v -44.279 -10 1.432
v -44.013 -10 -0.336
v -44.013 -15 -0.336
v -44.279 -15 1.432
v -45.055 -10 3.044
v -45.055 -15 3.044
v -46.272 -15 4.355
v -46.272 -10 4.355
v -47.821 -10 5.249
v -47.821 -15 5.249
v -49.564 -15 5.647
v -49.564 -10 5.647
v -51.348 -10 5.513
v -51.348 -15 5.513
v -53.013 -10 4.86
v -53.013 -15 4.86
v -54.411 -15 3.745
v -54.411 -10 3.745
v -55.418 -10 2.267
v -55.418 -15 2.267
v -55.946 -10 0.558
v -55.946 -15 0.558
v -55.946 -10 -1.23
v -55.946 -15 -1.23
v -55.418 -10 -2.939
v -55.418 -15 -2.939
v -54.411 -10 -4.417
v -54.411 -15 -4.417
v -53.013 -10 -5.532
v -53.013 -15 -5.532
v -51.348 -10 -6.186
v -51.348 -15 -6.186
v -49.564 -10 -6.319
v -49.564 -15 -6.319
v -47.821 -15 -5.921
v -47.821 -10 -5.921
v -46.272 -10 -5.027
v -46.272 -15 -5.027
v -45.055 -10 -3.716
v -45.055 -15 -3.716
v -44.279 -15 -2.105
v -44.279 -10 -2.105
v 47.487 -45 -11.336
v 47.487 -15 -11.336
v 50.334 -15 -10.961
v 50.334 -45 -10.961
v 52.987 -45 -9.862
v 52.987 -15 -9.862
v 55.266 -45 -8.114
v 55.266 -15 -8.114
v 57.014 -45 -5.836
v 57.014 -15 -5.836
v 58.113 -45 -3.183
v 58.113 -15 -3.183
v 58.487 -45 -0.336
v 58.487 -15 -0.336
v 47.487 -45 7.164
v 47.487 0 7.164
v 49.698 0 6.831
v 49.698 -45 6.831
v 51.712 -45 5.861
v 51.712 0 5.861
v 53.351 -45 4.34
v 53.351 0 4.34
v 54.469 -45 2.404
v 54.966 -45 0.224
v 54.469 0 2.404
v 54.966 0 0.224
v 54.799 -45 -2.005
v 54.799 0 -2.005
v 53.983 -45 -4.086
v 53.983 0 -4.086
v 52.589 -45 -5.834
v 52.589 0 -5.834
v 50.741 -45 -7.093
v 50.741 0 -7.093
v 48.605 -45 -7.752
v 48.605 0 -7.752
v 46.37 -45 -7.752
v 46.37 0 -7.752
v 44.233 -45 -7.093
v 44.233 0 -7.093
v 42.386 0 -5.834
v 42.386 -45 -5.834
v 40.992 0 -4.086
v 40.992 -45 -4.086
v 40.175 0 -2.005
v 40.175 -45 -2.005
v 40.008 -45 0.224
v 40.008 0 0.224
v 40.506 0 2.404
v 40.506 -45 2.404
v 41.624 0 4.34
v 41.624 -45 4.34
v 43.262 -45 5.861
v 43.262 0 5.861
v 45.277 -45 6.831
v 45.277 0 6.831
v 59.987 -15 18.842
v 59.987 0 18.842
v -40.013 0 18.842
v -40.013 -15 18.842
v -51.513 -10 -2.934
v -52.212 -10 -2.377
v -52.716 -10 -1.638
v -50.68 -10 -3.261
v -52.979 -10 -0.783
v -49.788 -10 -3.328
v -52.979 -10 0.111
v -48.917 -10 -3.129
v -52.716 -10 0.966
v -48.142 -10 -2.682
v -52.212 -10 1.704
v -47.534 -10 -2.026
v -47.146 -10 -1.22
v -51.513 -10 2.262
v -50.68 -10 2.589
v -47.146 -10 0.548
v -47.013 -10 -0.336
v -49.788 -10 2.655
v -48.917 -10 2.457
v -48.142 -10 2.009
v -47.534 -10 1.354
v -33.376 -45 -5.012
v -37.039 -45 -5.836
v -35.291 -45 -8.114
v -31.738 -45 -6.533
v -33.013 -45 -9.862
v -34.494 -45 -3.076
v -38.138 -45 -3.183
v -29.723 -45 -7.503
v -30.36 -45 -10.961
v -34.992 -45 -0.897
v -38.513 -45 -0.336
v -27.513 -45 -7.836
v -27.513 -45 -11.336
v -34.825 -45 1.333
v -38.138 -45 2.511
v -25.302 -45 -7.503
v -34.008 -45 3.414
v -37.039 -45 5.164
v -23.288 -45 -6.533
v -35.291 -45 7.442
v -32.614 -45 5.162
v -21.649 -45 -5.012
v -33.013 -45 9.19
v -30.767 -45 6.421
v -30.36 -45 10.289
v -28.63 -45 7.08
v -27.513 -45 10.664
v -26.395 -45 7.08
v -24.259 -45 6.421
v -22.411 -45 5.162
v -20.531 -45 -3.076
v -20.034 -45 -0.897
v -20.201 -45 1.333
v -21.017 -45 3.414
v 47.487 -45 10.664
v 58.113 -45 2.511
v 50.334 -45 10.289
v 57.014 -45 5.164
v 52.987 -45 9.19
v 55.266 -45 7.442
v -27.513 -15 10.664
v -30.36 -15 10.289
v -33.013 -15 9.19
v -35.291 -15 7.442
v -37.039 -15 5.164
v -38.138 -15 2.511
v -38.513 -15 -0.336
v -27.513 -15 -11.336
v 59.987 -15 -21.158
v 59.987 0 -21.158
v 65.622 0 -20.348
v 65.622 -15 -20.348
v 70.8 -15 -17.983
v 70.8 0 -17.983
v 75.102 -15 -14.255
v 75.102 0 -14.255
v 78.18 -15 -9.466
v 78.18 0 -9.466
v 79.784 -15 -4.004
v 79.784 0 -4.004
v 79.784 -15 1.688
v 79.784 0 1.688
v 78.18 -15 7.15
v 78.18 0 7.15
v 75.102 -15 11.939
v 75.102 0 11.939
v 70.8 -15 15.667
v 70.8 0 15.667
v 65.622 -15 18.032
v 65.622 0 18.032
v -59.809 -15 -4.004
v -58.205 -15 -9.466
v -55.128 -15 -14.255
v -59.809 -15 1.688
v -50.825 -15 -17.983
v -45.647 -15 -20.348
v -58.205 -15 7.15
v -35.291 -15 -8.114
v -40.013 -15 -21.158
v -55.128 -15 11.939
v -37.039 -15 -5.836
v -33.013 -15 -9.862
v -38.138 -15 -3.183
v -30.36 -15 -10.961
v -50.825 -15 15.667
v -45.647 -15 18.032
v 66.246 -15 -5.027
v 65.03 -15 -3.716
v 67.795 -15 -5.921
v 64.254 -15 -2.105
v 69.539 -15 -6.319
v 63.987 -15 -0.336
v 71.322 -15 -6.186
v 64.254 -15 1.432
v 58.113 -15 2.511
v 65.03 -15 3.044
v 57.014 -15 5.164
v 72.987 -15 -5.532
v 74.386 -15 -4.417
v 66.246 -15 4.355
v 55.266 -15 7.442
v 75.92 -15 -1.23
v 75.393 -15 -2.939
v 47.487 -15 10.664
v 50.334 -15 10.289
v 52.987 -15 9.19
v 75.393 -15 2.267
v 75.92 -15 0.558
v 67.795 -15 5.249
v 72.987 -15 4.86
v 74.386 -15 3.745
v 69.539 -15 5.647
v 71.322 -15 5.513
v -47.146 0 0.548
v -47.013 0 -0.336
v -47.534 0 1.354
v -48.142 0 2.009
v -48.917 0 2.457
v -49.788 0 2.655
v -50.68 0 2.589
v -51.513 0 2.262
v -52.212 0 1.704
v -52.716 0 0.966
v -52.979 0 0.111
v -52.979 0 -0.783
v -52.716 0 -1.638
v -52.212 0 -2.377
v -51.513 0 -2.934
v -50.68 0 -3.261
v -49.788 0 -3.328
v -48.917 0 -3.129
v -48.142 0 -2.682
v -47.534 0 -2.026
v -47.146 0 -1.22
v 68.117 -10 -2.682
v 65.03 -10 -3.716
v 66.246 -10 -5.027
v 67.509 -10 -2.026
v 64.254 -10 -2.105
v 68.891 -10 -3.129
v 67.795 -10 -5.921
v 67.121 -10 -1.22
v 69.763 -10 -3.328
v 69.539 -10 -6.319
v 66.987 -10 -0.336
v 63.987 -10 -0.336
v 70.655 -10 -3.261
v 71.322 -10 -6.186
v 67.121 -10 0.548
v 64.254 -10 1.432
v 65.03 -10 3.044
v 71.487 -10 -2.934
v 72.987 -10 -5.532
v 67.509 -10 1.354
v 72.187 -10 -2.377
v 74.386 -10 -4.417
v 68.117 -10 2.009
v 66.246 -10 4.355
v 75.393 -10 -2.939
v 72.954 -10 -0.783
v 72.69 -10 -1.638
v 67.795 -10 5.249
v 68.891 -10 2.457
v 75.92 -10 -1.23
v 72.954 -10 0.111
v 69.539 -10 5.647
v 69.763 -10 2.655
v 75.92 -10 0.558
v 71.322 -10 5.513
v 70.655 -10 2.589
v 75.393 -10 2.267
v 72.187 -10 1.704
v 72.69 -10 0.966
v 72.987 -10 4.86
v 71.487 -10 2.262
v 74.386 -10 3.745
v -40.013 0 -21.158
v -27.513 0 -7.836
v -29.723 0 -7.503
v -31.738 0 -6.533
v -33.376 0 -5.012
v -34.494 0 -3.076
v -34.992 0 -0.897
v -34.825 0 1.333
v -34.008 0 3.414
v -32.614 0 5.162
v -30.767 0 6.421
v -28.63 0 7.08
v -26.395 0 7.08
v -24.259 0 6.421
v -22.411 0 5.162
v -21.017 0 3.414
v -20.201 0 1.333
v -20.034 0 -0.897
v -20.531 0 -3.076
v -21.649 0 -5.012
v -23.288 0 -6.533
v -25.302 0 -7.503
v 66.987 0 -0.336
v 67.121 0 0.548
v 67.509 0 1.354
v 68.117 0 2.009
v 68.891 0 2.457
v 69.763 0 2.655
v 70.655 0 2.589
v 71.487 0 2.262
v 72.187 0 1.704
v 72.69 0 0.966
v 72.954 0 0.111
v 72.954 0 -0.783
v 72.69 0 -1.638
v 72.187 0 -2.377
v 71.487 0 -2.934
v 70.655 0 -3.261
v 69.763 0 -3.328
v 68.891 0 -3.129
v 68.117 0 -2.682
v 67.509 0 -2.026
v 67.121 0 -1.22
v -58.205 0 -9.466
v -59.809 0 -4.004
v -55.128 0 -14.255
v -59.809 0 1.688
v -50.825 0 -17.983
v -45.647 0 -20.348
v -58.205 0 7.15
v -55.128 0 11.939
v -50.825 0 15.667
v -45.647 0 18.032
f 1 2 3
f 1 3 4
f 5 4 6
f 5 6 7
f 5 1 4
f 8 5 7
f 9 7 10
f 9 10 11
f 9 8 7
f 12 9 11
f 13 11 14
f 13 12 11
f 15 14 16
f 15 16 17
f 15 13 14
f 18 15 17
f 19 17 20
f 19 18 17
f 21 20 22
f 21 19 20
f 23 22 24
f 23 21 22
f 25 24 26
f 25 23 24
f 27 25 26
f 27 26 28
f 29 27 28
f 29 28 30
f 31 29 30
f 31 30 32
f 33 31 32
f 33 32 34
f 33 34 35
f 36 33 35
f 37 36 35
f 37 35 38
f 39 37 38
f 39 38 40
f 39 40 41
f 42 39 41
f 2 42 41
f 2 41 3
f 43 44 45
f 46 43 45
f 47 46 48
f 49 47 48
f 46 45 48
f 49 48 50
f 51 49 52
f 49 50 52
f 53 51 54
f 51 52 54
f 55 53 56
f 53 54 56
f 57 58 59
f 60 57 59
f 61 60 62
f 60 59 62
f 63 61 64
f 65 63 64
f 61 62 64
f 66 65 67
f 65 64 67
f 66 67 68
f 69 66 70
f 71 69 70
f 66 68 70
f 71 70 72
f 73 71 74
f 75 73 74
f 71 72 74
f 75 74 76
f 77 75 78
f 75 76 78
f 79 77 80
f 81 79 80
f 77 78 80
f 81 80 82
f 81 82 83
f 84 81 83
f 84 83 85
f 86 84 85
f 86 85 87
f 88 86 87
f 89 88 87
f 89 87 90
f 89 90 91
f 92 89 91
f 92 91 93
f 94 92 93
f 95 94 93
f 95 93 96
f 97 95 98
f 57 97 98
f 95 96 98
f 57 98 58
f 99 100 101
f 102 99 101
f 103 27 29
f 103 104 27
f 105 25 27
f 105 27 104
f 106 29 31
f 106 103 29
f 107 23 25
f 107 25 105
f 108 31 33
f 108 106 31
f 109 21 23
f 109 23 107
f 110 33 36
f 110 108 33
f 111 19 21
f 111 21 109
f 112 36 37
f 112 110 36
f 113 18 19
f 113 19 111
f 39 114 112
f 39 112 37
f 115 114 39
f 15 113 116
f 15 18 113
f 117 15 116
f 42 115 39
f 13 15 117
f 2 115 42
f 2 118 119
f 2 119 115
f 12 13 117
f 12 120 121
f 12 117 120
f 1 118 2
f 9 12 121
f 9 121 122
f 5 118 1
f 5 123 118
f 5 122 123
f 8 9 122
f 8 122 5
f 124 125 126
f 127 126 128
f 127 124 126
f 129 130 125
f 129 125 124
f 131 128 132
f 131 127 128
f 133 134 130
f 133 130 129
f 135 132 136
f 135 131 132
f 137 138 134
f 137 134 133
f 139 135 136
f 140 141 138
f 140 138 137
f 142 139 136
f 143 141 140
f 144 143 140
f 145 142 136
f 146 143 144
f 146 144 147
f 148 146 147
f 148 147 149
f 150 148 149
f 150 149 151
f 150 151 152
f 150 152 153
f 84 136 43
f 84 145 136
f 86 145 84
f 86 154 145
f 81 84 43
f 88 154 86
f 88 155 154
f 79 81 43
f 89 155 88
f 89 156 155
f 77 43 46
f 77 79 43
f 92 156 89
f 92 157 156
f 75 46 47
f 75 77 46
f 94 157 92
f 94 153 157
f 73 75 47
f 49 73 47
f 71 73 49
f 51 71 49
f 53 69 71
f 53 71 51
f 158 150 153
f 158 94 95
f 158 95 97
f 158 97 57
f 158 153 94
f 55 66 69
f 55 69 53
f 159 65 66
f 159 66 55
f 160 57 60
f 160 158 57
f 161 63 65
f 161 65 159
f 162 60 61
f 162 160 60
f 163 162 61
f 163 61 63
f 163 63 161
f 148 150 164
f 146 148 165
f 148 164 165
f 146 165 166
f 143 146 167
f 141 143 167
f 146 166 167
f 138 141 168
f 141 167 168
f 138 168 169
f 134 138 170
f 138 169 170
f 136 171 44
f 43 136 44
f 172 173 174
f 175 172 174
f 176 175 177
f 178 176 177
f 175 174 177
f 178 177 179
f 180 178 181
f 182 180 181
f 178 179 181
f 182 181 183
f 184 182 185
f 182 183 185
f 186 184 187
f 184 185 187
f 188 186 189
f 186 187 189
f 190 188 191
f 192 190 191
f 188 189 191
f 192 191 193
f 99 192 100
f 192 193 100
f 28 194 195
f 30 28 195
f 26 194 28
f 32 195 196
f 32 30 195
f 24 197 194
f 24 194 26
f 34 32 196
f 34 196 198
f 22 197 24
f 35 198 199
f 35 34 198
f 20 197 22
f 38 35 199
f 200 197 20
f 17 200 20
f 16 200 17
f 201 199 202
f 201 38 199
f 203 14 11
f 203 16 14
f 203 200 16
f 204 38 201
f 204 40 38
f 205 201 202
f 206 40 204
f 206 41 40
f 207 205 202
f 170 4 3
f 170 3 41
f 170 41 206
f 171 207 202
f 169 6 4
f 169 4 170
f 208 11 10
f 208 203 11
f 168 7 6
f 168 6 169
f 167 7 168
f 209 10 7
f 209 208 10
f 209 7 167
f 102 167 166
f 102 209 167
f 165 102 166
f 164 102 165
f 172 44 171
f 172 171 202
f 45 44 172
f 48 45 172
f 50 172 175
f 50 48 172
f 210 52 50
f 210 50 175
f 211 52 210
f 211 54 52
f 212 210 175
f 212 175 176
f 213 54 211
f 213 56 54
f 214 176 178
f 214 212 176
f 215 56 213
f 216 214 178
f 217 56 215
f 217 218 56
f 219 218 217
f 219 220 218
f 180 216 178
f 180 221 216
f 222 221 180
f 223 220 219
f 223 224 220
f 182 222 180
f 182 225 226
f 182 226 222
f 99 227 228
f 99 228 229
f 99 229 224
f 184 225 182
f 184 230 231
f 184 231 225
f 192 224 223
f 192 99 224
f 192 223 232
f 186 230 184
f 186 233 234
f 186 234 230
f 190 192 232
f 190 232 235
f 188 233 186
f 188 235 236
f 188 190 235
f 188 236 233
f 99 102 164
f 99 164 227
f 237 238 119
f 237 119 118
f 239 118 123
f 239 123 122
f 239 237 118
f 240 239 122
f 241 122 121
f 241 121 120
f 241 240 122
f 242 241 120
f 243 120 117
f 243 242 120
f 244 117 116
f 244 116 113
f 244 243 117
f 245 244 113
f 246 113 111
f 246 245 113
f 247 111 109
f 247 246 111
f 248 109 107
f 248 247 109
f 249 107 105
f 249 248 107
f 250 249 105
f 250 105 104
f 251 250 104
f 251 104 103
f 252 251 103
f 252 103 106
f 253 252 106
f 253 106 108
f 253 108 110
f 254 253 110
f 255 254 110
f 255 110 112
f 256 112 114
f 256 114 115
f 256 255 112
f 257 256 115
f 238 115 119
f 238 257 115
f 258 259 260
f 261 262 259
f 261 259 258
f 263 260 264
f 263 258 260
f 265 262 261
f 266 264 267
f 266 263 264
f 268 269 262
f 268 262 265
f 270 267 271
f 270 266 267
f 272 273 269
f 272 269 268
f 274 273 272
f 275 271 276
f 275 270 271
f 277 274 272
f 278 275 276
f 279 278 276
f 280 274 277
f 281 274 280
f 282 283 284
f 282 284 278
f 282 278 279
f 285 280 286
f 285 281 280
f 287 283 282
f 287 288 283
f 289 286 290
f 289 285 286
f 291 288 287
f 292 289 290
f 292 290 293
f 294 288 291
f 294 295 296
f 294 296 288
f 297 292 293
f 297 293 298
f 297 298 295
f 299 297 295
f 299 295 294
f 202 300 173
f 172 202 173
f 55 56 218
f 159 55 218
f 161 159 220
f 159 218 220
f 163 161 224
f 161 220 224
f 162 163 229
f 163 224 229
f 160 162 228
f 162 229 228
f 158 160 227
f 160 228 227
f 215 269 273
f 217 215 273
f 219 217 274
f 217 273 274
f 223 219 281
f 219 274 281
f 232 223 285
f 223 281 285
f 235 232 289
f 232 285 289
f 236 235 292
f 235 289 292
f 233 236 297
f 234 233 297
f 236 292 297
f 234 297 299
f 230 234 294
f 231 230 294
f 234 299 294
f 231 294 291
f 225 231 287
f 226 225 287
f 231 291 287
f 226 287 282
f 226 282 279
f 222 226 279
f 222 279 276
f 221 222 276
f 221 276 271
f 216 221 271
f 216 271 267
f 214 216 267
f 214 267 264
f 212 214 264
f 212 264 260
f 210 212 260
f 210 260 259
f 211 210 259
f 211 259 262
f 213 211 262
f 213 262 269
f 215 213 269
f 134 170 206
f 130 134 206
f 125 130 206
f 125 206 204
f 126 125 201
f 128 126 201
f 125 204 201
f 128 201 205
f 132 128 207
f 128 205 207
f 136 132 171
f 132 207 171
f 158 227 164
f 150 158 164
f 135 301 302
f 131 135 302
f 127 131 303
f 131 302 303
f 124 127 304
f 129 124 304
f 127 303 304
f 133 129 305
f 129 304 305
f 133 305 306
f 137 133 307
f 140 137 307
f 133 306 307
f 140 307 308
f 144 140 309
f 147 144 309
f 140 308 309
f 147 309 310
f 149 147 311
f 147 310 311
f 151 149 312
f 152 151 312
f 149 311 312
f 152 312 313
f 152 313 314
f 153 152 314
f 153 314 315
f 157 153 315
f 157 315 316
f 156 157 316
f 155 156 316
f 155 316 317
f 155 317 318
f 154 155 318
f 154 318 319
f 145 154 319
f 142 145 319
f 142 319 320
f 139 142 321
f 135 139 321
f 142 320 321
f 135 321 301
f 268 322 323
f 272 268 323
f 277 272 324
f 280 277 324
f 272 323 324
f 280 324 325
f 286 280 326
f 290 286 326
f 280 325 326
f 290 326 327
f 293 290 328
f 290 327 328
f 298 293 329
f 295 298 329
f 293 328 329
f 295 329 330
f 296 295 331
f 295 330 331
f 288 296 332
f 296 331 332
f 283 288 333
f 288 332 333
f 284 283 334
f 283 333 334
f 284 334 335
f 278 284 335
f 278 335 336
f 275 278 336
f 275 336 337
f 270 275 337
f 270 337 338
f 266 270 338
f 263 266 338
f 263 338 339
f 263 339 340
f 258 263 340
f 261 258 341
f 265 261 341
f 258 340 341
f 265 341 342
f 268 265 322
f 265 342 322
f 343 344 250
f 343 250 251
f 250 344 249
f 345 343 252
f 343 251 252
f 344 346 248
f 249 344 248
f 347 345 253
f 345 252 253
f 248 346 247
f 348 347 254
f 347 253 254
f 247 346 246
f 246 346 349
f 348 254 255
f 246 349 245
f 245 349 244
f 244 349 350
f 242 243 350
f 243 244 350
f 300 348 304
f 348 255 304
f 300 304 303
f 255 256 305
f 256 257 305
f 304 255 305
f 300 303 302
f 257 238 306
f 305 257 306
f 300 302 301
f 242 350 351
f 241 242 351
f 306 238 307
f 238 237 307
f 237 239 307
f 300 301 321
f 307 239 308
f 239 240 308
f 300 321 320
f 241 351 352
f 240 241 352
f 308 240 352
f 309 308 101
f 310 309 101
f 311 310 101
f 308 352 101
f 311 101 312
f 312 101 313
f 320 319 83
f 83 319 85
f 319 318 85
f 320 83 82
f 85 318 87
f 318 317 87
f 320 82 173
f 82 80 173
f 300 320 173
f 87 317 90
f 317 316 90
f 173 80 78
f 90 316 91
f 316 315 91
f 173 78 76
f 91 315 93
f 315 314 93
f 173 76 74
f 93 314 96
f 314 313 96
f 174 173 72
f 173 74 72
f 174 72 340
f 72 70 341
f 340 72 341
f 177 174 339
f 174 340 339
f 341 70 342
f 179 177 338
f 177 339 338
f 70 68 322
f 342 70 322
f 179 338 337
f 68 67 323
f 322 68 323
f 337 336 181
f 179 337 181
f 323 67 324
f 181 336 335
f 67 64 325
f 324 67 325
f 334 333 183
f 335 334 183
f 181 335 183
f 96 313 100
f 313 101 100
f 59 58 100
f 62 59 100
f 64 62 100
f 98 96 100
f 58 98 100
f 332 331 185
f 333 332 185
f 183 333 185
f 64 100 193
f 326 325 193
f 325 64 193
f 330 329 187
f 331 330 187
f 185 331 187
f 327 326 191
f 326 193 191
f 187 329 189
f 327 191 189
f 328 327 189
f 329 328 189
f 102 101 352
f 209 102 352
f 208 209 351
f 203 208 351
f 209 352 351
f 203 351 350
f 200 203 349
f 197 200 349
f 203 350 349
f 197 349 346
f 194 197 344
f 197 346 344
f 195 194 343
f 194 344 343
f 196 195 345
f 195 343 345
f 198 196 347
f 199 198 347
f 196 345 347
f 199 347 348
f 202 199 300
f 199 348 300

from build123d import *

# Parameters (mm, degrees)
F0_R     = 6
F1_DEPTH = 15
F2_DEPTH = 45
F0_R_2   = 3
F3_DEPTH = 10


with BuildPart() as f1:
    # F0 (on Front) → F1 (new body)
    with BuildSketch(Plane.XZ):
        with BuildLine():
            Line((9.9873682983, 18.8420231841), (-40.0126317017, 18.8420231841))
            Line((-40.0126317017, 18.8420231841), (-40.0126317017, -0.3361211642))
            Line((-40.0126317017, -0.3361211642), (-38.5126317017, -0.3361211642))
            ThreePointArc((-38.5126317017, -0.3361211642), (-35.2908062948, 7.4420534289), (-27.5126317017, 10.6638788358))
            Line((-27.5126317017, 10.6638788358), (9.9873682983, 10.6638788358))
            Line((9.9873682983, 10.6638788358), (9.9873682983, 18.8420231841))
        make_face()
        with BuildLine():
            Line((59.9873682983, 18.8420231841), (9.9873682983, 18.8420231841))
            Line((9.9873682983, 18.8420231841), (9.9873682983, 10.6638788358))
            Line((9.9873682983, 10.6638788358), (47.4873682983, 10.6638788358))
            ThreePointArc((47.4873682983, 10.6638788358), (55.2655428913, 7.4420534289), (58.4873682983, -0.3361211642))
            Line((58.4873682983, -0.3361211642), (59.9873682983, -0.3361211642))
            Line((59.9873682983, -0.3361211642), (59.9873682983, 18.8420231841))
        make_face()
        with BuildLine():
            Line((-38.5126317017, -0.3361211642), (-40.0126317017, -0.3361211642))
            Line((-40.0126317017, -0.3361211642), (-40.0126317017, -21.1579768159))
            Line((-40.0126317017, -21.1579768159), (59.9873682983, -21.1579768159))
            Line((59.9873682983, -21.1579768159), (59.9873682983, -0.3361211642))
            Line((59.9873682983, -0.3361211642), (58.4873682983, -0.3361211642))
            ThreePointArc((58.4873682983, -0.3361211642), (55.2655428913, -8.1142957572), (47.4873682983, -11.3361211642))
            Line((47.4873682983, -11.3361211642), (-27.5126317017, -11.3361211642))
            ThreePointArc((-27.5126317017, -11.3361211642), (-35.2908062948, -8.1142957572), (-38.5126317017, -0.3361211642))
        make_face()
        with BuildLine():
            ThreePointArc((59.9873682983, -21.1579768159), (79.9873682983, -1.1579768159), (59.9873682983, 18.8420231841))
            Line((59.9873682983, 18.8420231841), (59.9873682983, -0.3361211642))
            Line((59.9873682983, -0.3361211642), (59.9873682983, -21.1579768159))
        make_face()
        with BuildLine():
            ThreePointArc((75.9873682983, -0.3361211642), (69.9873682983, -6.3361211642), (63.9873682983, -0.3361211642))
            ThreePointArc((63.9873682983, -0.3361211642), (69.9873682983, 5.6638788358), (75.9873682983, -0.3361211642))
        make_face(mode=Mode.SUBTRACT)
        with BuildLine():
            Line((-40.0126317017, -0.3361211642), (-40.0126317017, 18.8420231841))
            ThreePointArc((-40.0126317017, 18.8420231841), (-60.0126317017, -1.1579768159), (-40.0126317017, -21.1579768159))
            Line((-40.0126317017, -21.1579768159), (-40.0126317017, -0.3361211642))
        make_face()
        with Locations((-50.0126317017, -0.3361211642)):
            Circle(F0_R, mode=Mode.SUBTRACT)
    extrude(amount=F1_DEPTH)

    # F0 (on Front) → F2 (join)
    with BuildSketch(Plane.XZ):
        with BuildLine():
            Line((-27.5126317017, -7.8361211642), (-27.5126317017, -11.3361211642))
            Line((-27.5126317017, -11.3361211642), (47.4873682983, -11.3361211642))
            Line((47.4873682983, -11.3361211642), (47.4873682983, -7.8361211642))
            ThreePointArc((47.4873682983, -7.8361211642), (42.1840674394, -5.6394220231), (39.9873682983, -0.3361211642))
            Line((39.9873682983, -0.3361211642), (-20.0126317017, -0.3361211642))
            ThreePointArc((-20.0126317017, -0.3361211642), (-22.2093308428, -5.6394220231), (-27.5126317017, -7.8361211642))
        make_face()
        with BuildLine():
            Line((47.4873682983, 10.6638788358), (9.9873682983, 10.6638788358))
            Line((9.9873682983, 10.6638788358), (-27.5126317017, 10.6638788358))
            Line((-27.5126317017, 10.6638788358), (-27.5126317017, 7.1638788358))
            ThreePointArc((-27.5126317017, 7.1638788358), (-22.2093308428, 4.9671796947), (-20.0126317017, -0.3361211642))
            Line((-20.0126317017, -0.3361211642), (39.9873682983, -0.3361211642))
            ThreePointArc((39.9873682983, -0.3361211642), (42.1840674394, 4.9671796947), (47.4873682983, 7.1638788358))
            Line((47.4873682983, 7.1638788358), (47.4873682983, 10.6638788358))
        make_face()
        with BuildLine():
            ThreePointArc((-27.5126317017, 10.6638788358), (-35.2908062948, 7.4420534289), (-38.5126317017, -0.3361211642))
            Line((-38.5126317017, -0.3361211642), (-35.0126317017, -0.3361211642))
            ThreePointArc((-35.0126317017, -0.3361211642), (-32.8159325606, 4.9671796947), (-27.5126317017, 7.1638788358))
            Line((-27.5126317017, 7.1638788358), (-27.5126317017, 10.6638788358))
        make_face()
        with BuildLine():
            Line((-35.0126317017, -0.3361211642), (-38.5126317017, -0.3361211642))
            ThreePointArc((-38.5126317017, -0.3361211642), (-35.2908062948, -8.1142957572), (-27.5126317017, -11.3361211642))
            Line((-27.5126317017, -11.3361211642), (-27.5126317017, -7.8361211642))
            ThreePointArc((-27.5126317017, -7.8361211642), (-32.8159325606, -5.6394220231), (-35.0126317017, -0.3361211642))
        make_face()
        with BuildLine():
            ThreePointArc((47.4873682983, -11.3361211642), (55.2655428913, -8.1142957572), (58.4873682983, -0.3361211642))
            Line((58.4873682983, -0.3361211642), (54.9873682983, -0.3361211642))
            ThreePointArc((54.9873682983, -0.3361211642), (52.7906691572, -5.6394220231), (47.4873682983, -7.8361211642))
            Line((47.4873682983, -7.8361211642), (47.4873682983, -11.3361211642))
        make_face()
        with BuildLine():
            ThreePointArc((58.4873682983, -0.3361211642), (55.2655428913, 7.4420534289), (47.4873682983, 10.6638788358))
            Line((47.4873682983, 10.6638788358), (47.4873682983, 7.1638788358))
            ThreePointArc((47.4873682983, 7.1638788358), (52.7906691572, 4.9671796947), (54.9873682983, -0.3361211642))
            Line((54.9873682983, -0.3361211642), (58.4873682983, -0.3361211642))
        make_face()
    extrude(amount=F2_DEPTH)

    # F0 (on Front) → F3 (join)
    with BuildSketch(Plane.XZ):
        with BuildLine():
            ThreePointArc((75.9873682983, -0.3361211642), (69.9873682983, 5.6638788358), (63.9873682983, -0.3361211642))
            ThreePointArc((63.9873682983, -0.3361211642), (69.9873682983, -6.3361211642), (75.9873682983, -0.3361211642))
        make_face()
        with BuildLine():
            ThreePointArc((72.9873682983, -0.3361211642), (69.9873682983, -3.3361211642), (66.9873682983, -0.3361211642))
            ThreePointArc((66.9873682983, -0.3361211642), (69.9873682983, 2.6638788358), (72.9873682983, -0.3361211642))
        make_face(mode=Mode.SUBTRACT)
        with Locations((-50.0126317017, -0.3361211642)):
            Circle(F0_R)
        with Locations((-50.0126317017, -0.3361211642)):
            Circle(F0_R_2, mode=Mode.SUBTRACT)
    extrude(amount=F3_DEPTH)


solid = f1.part
